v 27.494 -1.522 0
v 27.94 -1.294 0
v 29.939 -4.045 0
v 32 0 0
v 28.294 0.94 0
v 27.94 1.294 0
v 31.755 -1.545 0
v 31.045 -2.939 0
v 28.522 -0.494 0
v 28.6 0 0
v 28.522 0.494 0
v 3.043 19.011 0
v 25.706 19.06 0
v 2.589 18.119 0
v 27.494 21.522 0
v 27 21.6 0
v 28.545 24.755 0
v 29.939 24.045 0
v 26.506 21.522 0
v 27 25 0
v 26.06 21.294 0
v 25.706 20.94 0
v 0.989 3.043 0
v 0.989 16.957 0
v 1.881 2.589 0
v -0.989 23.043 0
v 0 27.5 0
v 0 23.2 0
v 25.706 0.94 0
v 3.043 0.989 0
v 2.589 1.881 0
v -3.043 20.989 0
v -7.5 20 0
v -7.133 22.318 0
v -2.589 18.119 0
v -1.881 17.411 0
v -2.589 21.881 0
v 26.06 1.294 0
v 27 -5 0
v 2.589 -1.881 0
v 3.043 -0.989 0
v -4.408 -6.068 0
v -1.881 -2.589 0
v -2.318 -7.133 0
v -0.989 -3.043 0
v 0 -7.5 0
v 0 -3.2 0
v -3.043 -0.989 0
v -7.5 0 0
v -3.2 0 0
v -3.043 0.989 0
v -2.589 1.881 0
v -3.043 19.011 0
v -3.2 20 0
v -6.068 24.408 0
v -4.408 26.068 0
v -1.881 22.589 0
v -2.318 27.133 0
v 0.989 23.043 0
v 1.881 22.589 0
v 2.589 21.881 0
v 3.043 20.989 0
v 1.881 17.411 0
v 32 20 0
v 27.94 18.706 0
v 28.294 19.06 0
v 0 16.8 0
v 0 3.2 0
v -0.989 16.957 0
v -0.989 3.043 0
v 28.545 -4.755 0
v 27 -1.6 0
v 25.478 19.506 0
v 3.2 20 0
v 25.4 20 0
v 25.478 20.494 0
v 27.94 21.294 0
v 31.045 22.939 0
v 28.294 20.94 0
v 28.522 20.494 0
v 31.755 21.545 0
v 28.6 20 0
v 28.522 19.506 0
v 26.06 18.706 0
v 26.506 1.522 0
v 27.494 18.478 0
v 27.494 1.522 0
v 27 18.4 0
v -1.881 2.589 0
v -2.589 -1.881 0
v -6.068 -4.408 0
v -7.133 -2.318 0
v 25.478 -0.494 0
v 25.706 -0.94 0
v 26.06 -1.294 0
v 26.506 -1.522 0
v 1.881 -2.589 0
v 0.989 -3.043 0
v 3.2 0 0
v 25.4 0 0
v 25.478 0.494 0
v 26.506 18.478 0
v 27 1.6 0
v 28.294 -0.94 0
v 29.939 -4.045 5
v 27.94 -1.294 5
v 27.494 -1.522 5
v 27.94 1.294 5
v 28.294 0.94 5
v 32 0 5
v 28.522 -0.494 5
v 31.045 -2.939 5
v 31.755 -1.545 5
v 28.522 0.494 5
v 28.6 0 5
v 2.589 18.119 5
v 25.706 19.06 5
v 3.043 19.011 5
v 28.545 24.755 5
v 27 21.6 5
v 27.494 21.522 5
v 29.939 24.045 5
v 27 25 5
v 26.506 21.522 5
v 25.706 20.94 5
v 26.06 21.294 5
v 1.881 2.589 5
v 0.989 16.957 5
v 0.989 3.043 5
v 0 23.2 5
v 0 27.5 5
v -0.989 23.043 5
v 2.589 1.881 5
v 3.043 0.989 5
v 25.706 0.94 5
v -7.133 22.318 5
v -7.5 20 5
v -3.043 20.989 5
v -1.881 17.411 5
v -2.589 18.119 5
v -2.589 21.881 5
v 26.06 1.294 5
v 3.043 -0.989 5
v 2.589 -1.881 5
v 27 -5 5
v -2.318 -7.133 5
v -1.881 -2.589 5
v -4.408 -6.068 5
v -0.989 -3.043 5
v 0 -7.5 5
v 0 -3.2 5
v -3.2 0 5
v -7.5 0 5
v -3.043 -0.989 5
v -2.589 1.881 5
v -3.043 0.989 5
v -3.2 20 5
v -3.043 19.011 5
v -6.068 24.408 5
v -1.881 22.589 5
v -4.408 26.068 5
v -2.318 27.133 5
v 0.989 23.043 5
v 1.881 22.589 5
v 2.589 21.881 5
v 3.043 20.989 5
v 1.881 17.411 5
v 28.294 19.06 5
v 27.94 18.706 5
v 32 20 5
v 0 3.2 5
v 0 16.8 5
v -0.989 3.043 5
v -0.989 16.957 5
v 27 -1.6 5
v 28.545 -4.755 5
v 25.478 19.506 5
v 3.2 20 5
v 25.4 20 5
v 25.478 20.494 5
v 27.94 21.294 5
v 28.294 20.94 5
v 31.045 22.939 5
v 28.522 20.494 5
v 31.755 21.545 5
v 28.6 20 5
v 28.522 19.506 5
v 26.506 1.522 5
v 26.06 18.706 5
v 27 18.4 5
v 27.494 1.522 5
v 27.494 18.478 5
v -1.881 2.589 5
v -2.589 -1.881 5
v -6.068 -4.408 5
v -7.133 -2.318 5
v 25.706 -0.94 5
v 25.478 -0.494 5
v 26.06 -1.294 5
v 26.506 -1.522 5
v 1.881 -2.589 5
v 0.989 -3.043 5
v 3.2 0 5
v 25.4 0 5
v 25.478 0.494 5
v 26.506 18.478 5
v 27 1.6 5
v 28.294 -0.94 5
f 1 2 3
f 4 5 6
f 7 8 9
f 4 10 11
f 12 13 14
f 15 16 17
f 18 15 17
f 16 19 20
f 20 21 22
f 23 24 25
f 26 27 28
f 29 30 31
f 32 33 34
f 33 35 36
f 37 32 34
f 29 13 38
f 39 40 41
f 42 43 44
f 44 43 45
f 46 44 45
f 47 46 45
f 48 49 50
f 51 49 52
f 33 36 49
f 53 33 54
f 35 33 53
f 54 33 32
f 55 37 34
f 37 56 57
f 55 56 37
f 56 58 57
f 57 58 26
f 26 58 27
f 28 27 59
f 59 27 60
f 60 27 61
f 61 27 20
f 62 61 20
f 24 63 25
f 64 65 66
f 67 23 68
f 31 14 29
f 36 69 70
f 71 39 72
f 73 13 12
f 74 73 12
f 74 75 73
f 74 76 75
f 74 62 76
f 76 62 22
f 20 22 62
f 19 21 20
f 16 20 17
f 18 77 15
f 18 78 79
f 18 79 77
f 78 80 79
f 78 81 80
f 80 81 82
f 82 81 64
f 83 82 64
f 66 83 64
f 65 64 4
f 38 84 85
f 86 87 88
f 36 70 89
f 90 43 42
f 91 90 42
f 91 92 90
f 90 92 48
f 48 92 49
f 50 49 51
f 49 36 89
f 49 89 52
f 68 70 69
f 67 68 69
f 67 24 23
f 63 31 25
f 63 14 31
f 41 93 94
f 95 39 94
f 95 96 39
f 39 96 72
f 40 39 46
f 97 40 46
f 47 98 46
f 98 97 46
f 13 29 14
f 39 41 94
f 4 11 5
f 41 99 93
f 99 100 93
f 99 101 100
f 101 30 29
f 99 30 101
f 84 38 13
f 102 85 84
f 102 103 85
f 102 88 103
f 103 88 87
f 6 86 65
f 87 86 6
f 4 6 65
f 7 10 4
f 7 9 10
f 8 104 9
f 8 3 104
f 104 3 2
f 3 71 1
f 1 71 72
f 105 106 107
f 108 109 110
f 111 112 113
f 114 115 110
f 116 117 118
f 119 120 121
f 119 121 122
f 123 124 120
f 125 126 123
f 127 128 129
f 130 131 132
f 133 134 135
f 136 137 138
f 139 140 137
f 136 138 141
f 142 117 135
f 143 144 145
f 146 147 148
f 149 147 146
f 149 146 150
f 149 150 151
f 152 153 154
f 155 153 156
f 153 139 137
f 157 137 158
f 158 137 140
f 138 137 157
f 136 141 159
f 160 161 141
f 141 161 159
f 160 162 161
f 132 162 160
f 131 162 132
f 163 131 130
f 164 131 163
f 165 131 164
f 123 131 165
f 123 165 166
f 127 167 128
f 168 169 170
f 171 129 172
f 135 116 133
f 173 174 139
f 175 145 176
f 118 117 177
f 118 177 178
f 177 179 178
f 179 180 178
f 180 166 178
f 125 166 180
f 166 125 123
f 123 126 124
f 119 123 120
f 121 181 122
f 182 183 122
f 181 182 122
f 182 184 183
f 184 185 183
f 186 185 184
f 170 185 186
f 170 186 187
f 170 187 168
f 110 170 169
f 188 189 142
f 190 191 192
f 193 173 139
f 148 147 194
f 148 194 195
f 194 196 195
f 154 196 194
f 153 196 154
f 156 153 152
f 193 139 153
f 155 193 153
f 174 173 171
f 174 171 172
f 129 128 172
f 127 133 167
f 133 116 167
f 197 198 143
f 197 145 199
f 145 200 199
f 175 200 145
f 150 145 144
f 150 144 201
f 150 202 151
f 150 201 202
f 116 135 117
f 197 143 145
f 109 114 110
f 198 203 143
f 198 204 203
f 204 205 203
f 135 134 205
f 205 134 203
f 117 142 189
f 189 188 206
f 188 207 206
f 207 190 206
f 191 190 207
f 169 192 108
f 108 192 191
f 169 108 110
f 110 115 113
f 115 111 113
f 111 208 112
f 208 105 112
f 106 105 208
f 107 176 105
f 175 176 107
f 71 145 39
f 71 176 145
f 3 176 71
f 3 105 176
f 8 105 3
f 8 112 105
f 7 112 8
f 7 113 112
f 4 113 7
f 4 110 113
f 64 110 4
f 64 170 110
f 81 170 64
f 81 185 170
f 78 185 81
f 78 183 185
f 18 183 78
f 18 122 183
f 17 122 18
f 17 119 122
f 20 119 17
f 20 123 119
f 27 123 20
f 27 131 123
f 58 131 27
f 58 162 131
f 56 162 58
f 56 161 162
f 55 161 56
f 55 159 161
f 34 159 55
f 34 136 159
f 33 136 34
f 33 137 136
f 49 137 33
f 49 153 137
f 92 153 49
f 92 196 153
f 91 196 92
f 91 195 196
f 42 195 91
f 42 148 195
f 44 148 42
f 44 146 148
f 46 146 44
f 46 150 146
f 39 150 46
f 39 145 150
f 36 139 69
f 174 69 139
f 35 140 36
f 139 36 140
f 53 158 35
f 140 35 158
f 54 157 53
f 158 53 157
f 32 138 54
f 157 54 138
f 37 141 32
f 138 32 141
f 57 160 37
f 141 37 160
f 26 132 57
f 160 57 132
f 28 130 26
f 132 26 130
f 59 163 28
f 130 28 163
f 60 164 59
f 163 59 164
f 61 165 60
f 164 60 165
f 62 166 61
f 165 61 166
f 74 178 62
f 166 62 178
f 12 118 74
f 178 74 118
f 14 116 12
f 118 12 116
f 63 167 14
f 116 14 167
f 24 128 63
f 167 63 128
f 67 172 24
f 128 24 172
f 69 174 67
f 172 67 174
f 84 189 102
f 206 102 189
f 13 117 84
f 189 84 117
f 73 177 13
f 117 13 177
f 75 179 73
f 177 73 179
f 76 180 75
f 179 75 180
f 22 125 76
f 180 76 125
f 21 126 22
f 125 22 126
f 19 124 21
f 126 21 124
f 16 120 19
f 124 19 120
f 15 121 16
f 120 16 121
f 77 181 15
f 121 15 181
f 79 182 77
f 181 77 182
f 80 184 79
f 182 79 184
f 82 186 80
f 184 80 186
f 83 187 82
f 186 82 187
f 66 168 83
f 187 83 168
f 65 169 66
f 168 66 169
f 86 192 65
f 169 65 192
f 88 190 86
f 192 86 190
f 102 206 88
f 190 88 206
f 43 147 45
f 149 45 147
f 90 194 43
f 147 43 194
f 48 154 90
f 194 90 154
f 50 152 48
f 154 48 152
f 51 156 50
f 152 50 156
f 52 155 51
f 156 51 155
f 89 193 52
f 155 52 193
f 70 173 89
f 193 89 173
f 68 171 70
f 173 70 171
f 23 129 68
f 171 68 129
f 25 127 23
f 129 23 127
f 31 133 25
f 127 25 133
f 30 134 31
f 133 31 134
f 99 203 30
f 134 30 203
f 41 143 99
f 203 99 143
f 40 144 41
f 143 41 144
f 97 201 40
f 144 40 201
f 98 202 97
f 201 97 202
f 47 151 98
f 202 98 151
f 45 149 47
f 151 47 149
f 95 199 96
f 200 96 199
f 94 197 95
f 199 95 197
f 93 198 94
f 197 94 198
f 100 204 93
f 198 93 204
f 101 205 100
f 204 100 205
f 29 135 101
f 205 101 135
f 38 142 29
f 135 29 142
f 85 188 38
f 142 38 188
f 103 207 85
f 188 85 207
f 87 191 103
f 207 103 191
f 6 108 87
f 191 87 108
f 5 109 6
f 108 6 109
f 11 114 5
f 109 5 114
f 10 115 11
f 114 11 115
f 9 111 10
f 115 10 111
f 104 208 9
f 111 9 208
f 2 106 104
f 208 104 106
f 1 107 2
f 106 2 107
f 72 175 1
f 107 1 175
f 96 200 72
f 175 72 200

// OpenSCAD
// Simple plate to join perforated angle iron to openbeam

xcoords = [0, 27];
ycoords = [0, 20];

module coupler_2d() {
  difference() {
    hull() {
      for(y=ycoords) {
	translate([xcoords[0], y]) circle(d=15);
	translate([xcoords[1], y]) circle(d=10);
      }
    }
    for(y=ycoords) {
      translate([xcoords[0], y]) circle(d=6.4);
      translate([xcoords[1], y]) circle(d=3.2);
    }
  }
}
$fn=20;
linear_extrude(height=5) coupler_2d();
